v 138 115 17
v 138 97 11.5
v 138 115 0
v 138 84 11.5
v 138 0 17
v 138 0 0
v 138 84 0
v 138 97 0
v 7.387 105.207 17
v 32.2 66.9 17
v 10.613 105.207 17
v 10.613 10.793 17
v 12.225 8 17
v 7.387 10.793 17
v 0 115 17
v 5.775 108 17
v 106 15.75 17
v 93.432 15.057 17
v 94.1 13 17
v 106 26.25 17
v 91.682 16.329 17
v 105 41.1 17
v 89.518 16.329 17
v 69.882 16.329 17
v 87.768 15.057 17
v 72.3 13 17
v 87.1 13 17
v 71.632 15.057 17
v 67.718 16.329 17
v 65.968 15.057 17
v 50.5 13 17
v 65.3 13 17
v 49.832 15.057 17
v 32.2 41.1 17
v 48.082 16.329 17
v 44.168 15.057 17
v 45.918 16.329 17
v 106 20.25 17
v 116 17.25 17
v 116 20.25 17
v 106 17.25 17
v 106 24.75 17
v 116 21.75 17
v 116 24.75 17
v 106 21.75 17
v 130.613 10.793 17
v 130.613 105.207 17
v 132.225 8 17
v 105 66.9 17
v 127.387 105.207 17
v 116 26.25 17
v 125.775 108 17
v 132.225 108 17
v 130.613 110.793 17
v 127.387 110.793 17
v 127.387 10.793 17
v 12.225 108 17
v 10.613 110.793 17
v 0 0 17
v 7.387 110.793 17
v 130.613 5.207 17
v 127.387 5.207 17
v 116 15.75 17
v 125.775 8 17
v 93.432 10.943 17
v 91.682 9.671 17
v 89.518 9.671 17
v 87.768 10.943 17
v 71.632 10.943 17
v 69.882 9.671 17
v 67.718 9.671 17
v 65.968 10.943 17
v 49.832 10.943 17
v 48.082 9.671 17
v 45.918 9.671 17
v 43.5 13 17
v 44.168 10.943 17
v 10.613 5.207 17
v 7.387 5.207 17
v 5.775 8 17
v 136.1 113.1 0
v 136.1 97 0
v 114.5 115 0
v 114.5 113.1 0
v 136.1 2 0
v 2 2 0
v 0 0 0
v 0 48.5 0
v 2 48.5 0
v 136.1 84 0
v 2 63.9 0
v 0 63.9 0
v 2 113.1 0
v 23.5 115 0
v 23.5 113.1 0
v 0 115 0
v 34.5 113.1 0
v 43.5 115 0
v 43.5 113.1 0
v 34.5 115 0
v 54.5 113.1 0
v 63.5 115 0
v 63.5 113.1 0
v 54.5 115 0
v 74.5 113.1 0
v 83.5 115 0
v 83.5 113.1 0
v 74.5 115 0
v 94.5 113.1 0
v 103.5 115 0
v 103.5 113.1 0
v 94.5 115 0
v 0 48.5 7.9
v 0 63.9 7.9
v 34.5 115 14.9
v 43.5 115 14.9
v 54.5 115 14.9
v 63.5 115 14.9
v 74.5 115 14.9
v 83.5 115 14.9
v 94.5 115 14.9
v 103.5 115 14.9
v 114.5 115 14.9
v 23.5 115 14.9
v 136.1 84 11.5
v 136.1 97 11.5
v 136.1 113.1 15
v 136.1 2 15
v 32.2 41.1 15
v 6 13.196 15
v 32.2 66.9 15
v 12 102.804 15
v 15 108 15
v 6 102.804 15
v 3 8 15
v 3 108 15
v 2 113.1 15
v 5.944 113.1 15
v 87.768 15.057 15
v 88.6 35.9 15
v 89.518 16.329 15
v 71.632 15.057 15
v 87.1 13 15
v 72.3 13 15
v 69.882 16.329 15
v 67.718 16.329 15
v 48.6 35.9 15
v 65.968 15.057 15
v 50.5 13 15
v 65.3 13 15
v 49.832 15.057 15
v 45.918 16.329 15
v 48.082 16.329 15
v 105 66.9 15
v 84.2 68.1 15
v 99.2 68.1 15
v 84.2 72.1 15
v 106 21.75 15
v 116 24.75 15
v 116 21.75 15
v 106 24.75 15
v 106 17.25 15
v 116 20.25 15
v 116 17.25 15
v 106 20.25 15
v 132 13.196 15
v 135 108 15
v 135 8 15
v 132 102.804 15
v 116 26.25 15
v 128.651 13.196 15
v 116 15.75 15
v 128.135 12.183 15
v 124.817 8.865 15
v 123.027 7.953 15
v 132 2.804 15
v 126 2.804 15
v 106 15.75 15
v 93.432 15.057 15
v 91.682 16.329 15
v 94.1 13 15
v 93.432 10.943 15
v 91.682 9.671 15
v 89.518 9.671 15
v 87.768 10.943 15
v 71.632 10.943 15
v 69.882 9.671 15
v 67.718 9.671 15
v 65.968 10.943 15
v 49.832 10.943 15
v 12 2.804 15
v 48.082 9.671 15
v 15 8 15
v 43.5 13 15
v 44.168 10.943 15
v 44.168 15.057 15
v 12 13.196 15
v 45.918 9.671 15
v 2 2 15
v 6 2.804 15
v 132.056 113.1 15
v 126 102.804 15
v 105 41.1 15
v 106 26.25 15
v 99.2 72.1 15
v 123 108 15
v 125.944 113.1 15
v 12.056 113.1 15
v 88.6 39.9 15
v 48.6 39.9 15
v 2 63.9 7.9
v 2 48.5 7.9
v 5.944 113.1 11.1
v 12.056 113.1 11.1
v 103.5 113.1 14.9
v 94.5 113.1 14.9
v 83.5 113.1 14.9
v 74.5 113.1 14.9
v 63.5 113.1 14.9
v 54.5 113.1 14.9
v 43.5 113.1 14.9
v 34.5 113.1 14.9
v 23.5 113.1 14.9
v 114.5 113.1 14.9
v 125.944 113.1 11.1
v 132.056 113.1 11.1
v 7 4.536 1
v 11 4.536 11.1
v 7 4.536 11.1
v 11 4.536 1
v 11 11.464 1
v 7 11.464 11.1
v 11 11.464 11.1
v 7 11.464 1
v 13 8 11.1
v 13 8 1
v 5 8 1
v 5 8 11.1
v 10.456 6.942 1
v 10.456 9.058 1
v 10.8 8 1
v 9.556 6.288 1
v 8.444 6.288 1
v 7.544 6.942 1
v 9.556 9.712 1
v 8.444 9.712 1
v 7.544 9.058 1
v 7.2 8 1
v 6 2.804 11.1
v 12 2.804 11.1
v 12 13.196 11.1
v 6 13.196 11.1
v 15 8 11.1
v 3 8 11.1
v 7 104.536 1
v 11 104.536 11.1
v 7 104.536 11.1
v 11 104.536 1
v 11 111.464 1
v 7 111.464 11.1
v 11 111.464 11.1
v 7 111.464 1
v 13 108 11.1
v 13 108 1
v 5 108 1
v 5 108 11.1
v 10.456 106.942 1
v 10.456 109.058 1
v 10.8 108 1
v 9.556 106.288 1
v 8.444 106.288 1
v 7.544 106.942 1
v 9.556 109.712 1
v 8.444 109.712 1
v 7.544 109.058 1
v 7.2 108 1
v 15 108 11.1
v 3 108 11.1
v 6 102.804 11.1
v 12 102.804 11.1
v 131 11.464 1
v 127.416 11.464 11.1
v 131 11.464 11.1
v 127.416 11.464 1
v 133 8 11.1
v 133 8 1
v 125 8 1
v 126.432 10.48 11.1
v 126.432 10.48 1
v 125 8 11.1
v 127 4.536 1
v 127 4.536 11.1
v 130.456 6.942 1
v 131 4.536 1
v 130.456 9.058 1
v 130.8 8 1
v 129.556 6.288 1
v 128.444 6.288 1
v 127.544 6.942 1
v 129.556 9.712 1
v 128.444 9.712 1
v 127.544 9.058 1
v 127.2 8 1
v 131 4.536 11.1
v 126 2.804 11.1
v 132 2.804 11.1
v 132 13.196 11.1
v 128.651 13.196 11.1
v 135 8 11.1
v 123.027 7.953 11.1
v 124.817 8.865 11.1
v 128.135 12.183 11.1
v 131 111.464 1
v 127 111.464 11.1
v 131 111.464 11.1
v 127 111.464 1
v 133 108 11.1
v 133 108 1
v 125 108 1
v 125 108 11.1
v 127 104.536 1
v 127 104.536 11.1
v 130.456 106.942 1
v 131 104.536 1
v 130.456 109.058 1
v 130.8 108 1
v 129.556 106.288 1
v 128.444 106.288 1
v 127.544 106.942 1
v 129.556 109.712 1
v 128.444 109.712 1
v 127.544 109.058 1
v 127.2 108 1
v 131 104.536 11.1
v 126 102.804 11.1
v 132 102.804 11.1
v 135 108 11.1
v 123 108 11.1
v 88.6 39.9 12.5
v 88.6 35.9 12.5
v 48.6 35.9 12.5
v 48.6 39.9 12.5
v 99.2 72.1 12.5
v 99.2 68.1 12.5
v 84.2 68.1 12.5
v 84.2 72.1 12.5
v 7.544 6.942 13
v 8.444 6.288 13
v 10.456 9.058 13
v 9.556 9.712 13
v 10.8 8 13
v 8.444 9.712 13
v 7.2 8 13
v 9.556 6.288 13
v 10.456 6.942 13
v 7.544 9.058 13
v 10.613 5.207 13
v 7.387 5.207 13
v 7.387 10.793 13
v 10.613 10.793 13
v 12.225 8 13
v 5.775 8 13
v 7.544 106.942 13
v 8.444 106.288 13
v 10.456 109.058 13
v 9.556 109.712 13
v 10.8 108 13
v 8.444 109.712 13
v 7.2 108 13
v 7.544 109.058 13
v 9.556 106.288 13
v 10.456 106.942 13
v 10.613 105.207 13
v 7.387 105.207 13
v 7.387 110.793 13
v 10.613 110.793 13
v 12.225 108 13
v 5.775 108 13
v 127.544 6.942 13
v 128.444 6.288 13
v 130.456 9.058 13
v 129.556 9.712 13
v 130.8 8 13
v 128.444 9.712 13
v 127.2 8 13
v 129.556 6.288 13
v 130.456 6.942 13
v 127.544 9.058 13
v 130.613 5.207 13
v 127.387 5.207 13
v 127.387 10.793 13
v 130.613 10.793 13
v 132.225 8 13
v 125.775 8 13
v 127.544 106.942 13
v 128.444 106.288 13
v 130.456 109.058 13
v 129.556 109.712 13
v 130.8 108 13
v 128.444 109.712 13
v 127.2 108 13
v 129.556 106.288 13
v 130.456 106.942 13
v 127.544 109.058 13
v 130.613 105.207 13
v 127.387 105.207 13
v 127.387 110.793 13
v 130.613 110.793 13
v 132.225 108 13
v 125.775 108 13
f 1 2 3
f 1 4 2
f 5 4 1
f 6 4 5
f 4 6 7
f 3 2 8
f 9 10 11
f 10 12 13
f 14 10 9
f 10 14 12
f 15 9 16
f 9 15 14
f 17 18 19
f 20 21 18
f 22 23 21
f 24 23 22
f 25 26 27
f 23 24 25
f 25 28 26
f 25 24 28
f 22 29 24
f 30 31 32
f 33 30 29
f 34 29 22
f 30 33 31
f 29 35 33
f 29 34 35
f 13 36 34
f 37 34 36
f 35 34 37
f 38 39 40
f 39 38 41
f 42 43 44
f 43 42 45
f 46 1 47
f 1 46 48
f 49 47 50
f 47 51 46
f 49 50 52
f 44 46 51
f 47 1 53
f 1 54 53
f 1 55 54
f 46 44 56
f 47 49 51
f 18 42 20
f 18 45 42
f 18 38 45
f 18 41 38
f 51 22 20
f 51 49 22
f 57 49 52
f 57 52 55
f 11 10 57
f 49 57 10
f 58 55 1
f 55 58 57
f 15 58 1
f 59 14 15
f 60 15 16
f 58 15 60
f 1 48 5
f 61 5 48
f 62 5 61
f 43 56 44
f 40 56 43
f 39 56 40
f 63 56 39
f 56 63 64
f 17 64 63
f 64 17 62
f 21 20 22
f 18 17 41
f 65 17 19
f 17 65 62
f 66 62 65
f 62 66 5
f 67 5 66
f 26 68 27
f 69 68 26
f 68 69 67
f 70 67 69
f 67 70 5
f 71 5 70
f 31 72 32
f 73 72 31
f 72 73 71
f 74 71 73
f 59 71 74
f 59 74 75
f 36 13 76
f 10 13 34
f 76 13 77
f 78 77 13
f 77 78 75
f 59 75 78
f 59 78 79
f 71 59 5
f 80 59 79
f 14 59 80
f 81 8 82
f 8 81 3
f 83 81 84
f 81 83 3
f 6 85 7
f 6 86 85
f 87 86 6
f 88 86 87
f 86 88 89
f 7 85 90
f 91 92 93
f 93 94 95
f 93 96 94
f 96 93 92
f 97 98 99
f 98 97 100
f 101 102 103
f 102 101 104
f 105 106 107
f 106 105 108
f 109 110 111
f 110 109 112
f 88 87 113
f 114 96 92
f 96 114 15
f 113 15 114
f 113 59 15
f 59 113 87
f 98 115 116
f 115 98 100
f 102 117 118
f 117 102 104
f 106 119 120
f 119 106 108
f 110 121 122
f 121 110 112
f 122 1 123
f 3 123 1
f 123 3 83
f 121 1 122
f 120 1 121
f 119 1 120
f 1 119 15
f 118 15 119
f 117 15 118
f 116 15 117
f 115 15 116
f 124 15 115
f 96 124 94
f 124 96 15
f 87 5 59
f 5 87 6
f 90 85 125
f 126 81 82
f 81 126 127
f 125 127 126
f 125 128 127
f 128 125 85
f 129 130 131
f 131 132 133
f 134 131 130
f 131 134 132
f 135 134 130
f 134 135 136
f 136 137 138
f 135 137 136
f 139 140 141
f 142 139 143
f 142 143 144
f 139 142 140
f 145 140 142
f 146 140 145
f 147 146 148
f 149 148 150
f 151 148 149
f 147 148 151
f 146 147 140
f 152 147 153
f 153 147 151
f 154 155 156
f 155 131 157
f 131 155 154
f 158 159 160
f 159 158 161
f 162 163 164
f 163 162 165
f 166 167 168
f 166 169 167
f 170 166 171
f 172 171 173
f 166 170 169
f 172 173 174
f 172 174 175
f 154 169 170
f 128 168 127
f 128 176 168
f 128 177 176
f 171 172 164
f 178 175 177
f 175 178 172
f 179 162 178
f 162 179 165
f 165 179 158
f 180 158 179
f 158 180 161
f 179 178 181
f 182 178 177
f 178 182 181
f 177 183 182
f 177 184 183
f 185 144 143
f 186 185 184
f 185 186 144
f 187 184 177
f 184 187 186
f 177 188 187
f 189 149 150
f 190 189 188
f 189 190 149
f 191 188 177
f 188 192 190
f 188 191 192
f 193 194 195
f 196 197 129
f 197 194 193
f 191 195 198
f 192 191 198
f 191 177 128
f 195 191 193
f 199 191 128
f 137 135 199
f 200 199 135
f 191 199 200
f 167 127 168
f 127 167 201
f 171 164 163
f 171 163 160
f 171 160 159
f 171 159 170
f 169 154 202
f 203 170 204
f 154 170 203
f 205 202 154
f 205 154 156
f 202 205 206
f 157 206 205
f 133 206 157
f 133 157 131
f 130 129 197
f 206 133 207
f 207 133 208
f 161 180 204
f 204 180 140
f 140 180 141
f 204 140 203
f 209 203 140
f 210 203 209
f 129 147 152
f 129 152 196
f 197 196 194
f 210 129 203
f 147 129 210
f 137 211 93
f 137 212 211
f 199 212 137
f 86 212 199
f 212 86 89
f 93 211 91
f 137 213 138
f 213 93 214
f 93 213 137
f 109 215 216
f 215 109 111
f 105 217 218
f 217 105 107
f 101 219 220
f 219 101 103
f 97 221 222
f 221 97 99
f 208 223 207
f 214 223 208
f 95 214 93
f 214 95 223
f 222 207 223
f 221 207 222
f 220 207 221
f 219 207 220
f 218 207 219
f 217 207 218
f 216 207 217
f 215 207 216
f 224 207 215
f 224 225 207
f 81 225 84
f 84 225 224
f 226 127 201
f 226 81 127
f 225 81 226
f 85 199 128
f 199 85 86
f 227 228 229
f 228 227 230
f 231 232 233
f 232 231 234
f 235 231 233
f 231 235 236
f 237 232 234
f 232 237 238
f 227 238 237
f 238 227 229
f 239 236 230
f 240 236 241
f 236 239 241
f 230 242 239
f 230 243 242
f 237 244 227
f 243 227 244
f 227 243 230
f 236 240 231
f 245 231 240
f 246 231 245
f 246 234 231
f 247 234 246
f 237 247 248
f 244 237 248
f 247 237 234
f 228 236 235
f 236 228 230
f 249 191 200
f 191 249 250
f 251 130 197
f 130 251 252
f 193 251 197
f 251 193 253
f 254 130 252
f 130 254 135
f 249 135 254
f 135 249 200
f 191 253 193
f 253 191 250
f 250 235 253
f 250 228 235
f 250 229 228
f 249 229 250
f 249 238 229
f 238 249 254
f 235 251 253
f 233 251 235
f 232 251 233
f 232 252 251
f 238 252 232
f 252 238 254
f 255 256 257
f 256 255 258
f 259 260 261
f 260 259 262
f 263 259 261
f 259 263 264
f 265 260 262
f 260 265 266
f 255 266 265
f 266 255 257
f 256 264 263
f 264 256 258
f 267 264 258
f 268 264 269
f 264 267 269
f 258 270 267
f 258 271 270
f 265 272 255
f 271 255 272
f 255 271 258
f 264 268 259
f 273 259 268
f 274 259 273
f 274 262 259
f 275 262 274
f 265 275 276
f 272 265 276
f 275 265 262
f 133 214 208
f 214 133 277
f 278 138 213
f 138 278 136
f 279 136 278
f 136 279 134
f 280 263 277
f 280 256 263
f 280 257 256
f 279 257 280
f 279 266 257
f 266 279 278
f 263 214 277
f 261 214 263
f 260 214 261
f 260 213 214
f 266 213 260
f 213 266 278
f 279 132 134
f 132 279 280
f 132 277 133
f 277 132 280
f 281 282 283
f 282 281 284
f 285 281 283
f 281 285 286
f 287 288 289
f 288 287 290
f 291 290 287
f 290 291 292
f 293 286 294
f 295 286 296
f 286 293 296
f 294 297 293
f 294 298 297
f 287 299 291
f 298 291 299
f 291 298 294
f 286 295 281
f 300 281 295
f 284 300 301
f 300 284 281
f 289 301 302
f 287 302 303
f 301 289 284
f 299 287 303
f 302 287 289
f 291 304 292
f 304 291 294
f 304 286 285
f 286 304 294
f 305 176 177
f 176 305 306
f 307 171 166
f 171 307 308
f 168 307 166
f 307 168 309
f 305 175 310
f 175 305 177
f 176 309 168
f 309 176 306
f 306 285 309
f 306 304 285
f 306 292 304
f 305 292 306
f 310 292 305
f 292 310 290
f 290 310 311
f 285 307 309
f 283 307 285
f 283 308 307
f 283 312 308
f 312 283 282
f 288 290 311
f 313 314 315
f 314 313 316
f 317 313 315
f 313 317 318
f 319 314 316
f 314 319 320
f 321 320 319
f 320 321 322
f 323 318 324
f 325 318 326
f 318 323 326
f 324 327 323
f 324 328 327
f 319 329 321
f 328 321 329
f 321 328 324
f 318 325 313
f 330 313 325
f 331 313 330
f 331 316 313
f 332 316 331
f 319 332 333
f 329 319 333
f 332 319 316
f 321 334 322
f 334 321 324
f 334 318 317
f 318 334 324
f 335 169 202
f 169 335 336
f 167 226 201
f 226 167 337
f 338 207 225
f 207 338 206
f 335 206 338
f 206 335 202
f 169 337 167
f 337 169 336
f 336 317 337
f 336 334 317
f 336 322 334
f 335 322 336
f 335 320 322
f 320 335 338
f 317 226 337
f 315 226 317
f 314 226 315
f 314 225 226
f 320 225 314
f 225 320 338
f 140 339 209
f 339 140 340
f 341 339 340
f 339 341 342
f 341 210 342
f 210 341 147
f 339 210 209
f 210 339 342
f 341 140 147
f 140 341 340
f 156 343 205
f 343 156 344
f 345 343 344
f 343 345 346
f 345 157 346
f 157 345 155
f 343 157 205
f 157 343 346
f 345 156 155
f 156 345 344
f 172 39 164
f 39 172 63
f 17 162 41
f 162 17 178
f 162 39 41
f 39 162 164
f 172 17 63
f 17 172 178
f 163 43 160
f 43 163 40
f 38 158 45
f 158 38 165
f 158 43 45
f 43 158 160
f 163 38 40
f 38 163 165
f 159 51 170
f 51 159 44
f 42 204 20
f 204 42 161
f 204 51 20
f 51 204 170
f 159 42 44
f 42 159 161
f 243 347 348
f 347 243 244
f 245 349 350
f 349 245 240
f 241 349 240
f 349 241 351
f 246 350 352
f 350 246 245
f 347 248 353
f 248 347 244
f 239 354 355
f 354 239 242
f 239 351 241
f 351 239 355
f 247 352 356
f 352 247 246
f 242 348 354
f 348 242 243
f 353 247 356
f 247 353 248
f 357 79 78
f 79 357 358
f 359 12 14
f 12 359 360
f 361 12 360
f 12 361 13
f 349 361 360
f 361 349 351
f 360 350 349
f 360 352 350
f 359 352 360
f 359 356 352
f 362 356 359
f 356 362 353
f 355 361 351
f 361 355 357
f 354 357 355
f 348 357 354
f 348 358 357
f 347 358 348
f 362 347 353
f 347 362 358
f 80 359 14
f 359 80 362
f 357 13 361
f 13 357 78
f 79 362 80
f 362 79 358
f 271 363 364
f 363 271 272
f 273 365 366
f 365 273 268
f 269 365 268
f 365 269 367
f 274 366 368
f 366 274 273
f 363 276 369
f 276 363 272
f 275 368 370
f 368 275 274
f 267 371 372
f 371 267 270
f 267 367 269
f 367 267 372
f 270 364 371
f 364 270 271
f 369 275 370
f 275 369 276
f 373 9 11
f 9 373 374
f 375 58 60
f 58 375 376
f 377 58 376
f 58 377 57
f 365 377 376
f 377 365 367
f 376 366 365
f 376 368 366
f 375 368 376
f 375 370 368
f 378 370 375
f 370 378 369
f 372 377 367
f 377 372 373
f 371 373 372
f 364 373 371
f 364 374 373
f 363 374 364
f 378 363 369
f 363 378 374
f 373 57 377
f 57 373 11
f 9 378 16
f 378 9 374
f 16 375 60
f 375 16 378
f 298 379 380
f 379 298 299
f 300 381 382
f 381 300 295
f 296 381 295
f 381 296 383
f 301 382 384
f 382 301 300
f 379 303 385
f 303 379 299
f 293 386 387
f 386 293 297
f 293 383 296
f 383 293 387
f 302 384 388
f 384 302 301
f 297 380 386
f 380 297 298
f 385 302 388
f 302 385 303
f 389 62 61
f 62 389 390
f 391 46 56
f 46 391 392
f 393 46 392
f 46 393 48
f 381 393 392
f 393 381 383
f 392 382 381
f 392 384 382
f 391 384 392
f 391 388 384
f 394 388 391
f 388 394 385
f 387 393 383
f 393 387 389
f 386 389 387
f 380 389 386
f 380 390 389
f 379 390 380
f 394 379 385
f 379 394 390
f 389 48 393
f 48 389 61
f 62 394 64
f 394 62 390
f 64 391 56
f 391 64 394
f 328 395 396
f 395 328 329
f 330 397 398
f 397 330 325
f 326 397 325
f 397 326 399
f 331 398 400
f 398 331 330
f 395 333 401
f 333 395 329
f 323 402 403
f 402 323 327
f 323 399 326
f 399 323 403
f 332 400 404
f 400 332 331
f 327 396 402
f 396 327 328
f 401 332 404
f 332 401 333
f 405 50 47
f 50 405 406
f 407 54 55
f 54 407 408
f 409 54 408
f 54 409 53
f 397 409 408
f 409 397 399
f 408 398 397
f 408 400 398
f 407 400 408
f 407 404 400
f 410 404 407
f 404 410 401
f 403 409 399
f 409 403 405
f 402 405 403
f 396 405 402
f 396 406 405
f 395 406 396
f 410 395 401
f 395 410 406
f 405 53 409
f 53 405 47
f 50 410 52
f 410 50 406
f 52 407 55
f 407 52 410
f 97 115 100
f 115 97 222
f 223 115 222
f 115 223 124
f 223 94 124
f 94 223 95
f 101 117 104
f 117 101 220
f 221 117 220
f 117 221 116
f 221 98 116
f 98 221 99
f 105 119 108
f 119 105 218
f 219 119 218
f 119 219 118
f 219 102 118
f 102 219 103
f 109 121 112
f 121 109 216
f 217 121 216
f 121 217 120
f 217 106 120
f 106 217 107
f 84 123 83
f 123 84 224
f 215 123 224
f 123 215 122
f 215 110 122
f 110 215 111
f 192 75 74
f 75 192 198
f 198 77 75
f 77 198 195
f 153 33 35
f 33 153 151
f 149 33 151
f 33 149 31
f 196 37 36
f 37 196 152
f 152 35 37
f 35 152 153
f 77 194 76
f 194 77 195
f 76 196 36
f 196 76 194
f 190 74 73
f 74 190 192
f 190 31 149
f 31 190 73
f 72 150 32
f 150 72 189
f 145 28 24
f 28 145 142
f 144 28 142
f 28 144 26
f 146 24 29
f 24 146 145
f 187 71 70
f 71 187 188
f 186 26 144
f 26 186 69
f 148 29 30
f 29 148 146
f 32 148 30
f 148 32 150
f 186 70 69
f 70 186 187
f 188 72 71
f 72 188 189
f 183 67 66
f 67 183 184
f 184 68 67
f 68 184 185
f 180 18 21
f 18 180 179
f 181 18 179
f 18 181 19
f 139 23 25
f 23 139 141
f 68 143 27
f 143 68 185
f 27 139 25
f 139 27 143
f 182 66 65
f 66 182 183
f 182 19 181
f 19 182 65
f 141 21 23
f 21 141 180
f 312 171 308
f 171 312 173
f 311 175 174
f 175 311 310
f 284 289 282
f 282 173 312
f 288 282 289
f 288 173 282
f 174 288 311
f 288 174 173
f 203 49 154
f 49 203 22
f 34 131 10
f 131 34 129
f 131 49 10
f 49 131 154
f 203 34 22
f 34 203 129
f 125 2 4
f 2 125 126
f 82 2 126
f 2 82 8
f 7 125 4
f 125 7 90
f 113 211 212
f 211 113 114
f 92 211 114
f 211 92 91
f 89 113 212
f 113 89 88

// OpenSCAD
tol = 0.5;
screen_tol = 0.8;
pcb_x = 130;
pcb_y = 110;
pcb_z = 4;
bolt_d = 3.6;
shift_bolt = 5;

// box thickness
th = 2;

shift_x = 4;
shift_y = th + 1;

box_x = pcb_x + shift_x + 4;
box_y = pcb_y + shift_y + th;

pcb_width = 2;
pcb_up = 9;

box_z = th + pcb_up + pcb_width - 1;

socket_h = 15;
socket_w = 10;
socket_n = 5;
socket_int = 20;
start_socket_x = 20 + shift_x;
eps = 1e-1;

usb_type_b_w = 12;
usb_type_b_h = 11;
start_type_b_y = shift_y + 81.5;
//start_type_b_z = th + pcb_z + tol;

usb_type_a_w = 14.4;
usb_type_a_h = 7.8;
start_type_a_y = shift_y + 46;
//start_type_a_z = th + pcb_z + tol;

// programmator
micro_x = 10;
micro_y = 21.1;
micro_start_x = shift_x + 4.75;
micro_start_y = shift_y + pcb_y - 23.3 - micro_y;

contrast_start_x = shift_x + 38.4;
contrast_start_y = shift_y + 25.7;
volume_start_x = shift_x + pcb_x - 39.2;
volume_start_y = contrast_start_y;
pot_d = 7;
under_pcb = 13;
fn = 10;
gaika_h = 4;
gaika_w = 5.5;
stoiki_r = 4;
wide_stoiki_r = stoiki_r + 2;



translate([0,0,-50]) {

difference() {
  union() {
    difference() {
      cube([box_x,box_y,box_z], false);
      translate([th, th, th]) {
        cube([box_x-2*th+eps, box_y-2*th+eps, box_z-th+eps], false);
      }
    }
    // under_pcb, stoiki
    for (dy = [shift_y+shift_bolt, shift_y+pcb_y-shift_bolt]) {
      for (dx = [shift_x+shift_bolt, shift_x+pcb_x-shift_bolt]) {
//        translate([dx,dy,pcb_up/2+th-eps]) {
//          cube(size=[under_pcb,under_pcb,pcb_up], center=true);
//        }
        translate([dx,dy,th-eps]) {
          cylinder($fn=6, r=stoiki_r, h=pcb_up);
          cylinder($fn=6, r=wide_stoiki_r, h=gaika_h);
        }
      }
    }
    translate([box_x/2, box_y/2, th-eps]) {
      cylinder($fn=6, r=stoiki_r, h=pcb_up);
    }
  }

  // bolts
  for (dx = [shift_x+shift_bolt, shift_x+pcb_x-shift_bolt]) {
    for (dy = [shift_y+shift_bolt, shift_y+pcb_y-shift_bolt]) {
      translate([dx,dy,-eps]) {
        cylinder($fn=fn, r=bolt_d/2, h=th+pcb_up+2*eps);
        // gaika
        cylinder($fn=6, r=gaika_w / 2 / cos(30) + 0.05, h=gaika_h);
      }
    }
  }

//    // usb_in1 type b
//    translate([box_x-th-eps, start_type_b_y-tol, start_type_b_z]) {
//        cube(size=[th+2*eps, usb_type_b_w+2*tol, box_z]);
//    }

//    // usb_out1 type a
//    translate([-eps, start_type_a_y - tol, start_type_a_z]) {
//        cube(size=[th+2*eps, usb_type_a_w + 2*tol, box_z]);
//    }

    // programmator
    translate([micro_start_x-tol,micro_start_y-tol, -eps]) {
      cube(size=[micro_x+2*tol, micro_y+2*tol, th+2*eps]);
    }

    // contrast
    translate([contrast_start_x, contrast_start_y, -eps]) {
      cylinder($fn=fn, r=pot_d/2, h=th+2*eps);
    }

    // volume
//    translate([volume_start_x, volume_start_y, -eps]) {
//      cylinder($fn=20, r=pot_d/2, h=th+2*eps);
//    }
}
}

top_box_z = 15 + th;
stoiki_h = top_box_z - th;
wide_stoiki_h = 4;
pcb_room = 1;
screen_start_x = shift_x + 29;
screen_start_y = shift_y + 38.9;
screen_length_x = 71.2;
screen_length_y = 24.2;
screen_hold_x = 40;
screen_hold_y = 4;
screen_hold_start_z = 12.5;
screen_hold_y_shift = 2;
screen_hold_up_x = 15;
screen_hold_up_x_shift = 5;

master_button_y = shift_y + 10;
master_button_x = shift_x + 43;
master_button_int = 21.8;
master_button_r = 3;
top_bolt_h = 1.5;
top_bolt_r = 3.5;
speaker_shift = 18;
speaker_r = 15;
speaker_h = 15;
speaker_hole_d = 10;
speaker_hole_int = 3;
speaker_hole_w = 1.5;
speaker_shift = 18;

!difference() {
  union() {
    difference() {
      cube([box_x,box_y,top_box_z], false);
      translate([th, th, -eps]) {
        cube([box_x-2*th+eps, box_y-2*th+eps, top_box_z-th+eps], false);
      }
    }
    // stoiki
    for (dx = [shift_x+shift_bolt, shift_x+pcb_x-shift_bolt]) {
      for (dy = [shift_y+shift_bolt, shift_y+pcb_y-shift_bolt]) {
        translate([dx,dy,pcb_room]) {
          cylinder($fn=6, r=stoiki_r, h=top_box_z-th+eps);
        }
        translate([dx,dy,top_box_z-th-wide_stoiki_h+eps]) {
          cylinder($fn=6, r=wide_stoiki_r, h=wide_stoiki_h+th-2*eps);
        }
      }
    }
    // screen_hold
    translate([screen_start_x + (screen_length_x - screen_hold_x)/2, screen_start_y - screen_hold_y_shift - screen_hold_y, screen_hold_start_z]) {
	cube([screen_hold_x, screen_hold_y, top_box_z - screen_hold_start_z - th + eps]);
    }
    translate([screen_start_x + screen_length_x - screen_hold_up_x - screen_hold_up_x_shift, screen_start_y + screen_length_y + screen_hold_y_shift, screen_hold_start_z]) {
	cube([screen_hold_up_x, screen_hold_y, top_box_z - screen_hold_start_z - th + eps]);
    }
  }
  // - speaker na stoikah
  translate([shift_x + pcb_x - 18, shift_y + 18, 0]) {
    cylinder(r=speaker_r, h = 15, $fn=20);
  }
  // speaker_hole
  for (dy = [shift_y + speaker_shift - speaker_hole_int - speaker_hole_w*3/2, 
             shift_y + speaker_shift - speaker_hole_w/2, 
             shift_y + speaker_shift + speaker_hole_int + speaker_hole_w/2]) { 
    translate([shift_x + pcb_x - speaker_shift - speaker_hole_d, dy, top_box_z-th-eps]) {
      cube(size=[speaker_hole_d, speaker_hole_w, th + 2*eps]);
    }
  }

  // bolts
  for (dx = [shift_x+shift_bolt, shift_x+pcb_x-shift_bolt]) {
    for (dy = [shift_y+shift_bolt, shift_y+pcb_y-shift_bolt]) {
      translate([dx,dy,-eps]) {
        cylinder($fn=fn, r=bolt_d/2, h=top_box_z+2*eps);
      }
      translate([dx, dy, top_box_z - wide_stoiki_h]) {
        cylinder($fn=6, r=gaika_w / 2 / cos(30) + 0.05, h=wide_stoiki_h+eps);
        //cylinder($fn=6, r=top_bolt_r, h=top_bolt_h + eps);
      }
    }
  }

  // screen
  translate([screen_start_x - screen_tol, screen_start_y - screen_tol, top_box_z - th - eps]) {
      cube([screen_length_x + 2*screen_tol, screen_length_y + 2*screen_tol, th + 2*eps]);
  }
  // sockets
  for (i = [0:1:socket_n-1]) {
      translate([start_socket_x+i*socket_int - tol, box_y-th-eps, -eps]) {
        cube(size=[socket_w + 2*tol, th+2*eps, socket_h]);
      }
  }
  // type_b
  translate([box_x - th - eps, start_type_b_y - tol, -tol]) {
      cube([th + 2*eps, usb_type_b_w + 2*tol, usb_type_b_h + 2*tol]);
  }
  // type_a
  translate([-eps, start_type_a_y - tol, -eps]) {
      cube([th + 2*eps, usb_type_a_w + 2*tol, usb_type_a_h + 2*eps]);
  }
  // master buttons
  for (i = [0:1:2]) {
    //dx = master_button_x + master_button_int*i;
    translate([master_button_x + master_button_int*i, master_button_y, top_box_z - th - eps]) {
      cylinder($fn=fn, r=master_button_r + tol, h=th+2*eps);
    }
  }
}


//// bolts
//for (dx = [shift_x+shift_bolt, shift_x+pcb_x-shift_bolt]) {
//  for (dy = [shift_y+shift_bolt, shift_y+pcb_y-shift_bolt]) {
//    difference() {
//      translate([dx,dy,pcb_up/2+th]) {
//        cube(size=[a,a,pcb_up], center=true);
//      }
//      translate([dx,dy,-eps]) {
//        cylinder($fn=20, r=bolt_d/2, h=th+pcb_up+2*eps);
//      }
//    }
//  }
//}


//leg_r = t;
//shift = t/2+leg_r;
//for (dx = [shift, a-shift])
//    for (dy = [shift, b-shift]) {
//        translate([dx, dy, 0]) {
//            cylinder(h=c, r=leg_r, $fn=40);
//        }
//    }
